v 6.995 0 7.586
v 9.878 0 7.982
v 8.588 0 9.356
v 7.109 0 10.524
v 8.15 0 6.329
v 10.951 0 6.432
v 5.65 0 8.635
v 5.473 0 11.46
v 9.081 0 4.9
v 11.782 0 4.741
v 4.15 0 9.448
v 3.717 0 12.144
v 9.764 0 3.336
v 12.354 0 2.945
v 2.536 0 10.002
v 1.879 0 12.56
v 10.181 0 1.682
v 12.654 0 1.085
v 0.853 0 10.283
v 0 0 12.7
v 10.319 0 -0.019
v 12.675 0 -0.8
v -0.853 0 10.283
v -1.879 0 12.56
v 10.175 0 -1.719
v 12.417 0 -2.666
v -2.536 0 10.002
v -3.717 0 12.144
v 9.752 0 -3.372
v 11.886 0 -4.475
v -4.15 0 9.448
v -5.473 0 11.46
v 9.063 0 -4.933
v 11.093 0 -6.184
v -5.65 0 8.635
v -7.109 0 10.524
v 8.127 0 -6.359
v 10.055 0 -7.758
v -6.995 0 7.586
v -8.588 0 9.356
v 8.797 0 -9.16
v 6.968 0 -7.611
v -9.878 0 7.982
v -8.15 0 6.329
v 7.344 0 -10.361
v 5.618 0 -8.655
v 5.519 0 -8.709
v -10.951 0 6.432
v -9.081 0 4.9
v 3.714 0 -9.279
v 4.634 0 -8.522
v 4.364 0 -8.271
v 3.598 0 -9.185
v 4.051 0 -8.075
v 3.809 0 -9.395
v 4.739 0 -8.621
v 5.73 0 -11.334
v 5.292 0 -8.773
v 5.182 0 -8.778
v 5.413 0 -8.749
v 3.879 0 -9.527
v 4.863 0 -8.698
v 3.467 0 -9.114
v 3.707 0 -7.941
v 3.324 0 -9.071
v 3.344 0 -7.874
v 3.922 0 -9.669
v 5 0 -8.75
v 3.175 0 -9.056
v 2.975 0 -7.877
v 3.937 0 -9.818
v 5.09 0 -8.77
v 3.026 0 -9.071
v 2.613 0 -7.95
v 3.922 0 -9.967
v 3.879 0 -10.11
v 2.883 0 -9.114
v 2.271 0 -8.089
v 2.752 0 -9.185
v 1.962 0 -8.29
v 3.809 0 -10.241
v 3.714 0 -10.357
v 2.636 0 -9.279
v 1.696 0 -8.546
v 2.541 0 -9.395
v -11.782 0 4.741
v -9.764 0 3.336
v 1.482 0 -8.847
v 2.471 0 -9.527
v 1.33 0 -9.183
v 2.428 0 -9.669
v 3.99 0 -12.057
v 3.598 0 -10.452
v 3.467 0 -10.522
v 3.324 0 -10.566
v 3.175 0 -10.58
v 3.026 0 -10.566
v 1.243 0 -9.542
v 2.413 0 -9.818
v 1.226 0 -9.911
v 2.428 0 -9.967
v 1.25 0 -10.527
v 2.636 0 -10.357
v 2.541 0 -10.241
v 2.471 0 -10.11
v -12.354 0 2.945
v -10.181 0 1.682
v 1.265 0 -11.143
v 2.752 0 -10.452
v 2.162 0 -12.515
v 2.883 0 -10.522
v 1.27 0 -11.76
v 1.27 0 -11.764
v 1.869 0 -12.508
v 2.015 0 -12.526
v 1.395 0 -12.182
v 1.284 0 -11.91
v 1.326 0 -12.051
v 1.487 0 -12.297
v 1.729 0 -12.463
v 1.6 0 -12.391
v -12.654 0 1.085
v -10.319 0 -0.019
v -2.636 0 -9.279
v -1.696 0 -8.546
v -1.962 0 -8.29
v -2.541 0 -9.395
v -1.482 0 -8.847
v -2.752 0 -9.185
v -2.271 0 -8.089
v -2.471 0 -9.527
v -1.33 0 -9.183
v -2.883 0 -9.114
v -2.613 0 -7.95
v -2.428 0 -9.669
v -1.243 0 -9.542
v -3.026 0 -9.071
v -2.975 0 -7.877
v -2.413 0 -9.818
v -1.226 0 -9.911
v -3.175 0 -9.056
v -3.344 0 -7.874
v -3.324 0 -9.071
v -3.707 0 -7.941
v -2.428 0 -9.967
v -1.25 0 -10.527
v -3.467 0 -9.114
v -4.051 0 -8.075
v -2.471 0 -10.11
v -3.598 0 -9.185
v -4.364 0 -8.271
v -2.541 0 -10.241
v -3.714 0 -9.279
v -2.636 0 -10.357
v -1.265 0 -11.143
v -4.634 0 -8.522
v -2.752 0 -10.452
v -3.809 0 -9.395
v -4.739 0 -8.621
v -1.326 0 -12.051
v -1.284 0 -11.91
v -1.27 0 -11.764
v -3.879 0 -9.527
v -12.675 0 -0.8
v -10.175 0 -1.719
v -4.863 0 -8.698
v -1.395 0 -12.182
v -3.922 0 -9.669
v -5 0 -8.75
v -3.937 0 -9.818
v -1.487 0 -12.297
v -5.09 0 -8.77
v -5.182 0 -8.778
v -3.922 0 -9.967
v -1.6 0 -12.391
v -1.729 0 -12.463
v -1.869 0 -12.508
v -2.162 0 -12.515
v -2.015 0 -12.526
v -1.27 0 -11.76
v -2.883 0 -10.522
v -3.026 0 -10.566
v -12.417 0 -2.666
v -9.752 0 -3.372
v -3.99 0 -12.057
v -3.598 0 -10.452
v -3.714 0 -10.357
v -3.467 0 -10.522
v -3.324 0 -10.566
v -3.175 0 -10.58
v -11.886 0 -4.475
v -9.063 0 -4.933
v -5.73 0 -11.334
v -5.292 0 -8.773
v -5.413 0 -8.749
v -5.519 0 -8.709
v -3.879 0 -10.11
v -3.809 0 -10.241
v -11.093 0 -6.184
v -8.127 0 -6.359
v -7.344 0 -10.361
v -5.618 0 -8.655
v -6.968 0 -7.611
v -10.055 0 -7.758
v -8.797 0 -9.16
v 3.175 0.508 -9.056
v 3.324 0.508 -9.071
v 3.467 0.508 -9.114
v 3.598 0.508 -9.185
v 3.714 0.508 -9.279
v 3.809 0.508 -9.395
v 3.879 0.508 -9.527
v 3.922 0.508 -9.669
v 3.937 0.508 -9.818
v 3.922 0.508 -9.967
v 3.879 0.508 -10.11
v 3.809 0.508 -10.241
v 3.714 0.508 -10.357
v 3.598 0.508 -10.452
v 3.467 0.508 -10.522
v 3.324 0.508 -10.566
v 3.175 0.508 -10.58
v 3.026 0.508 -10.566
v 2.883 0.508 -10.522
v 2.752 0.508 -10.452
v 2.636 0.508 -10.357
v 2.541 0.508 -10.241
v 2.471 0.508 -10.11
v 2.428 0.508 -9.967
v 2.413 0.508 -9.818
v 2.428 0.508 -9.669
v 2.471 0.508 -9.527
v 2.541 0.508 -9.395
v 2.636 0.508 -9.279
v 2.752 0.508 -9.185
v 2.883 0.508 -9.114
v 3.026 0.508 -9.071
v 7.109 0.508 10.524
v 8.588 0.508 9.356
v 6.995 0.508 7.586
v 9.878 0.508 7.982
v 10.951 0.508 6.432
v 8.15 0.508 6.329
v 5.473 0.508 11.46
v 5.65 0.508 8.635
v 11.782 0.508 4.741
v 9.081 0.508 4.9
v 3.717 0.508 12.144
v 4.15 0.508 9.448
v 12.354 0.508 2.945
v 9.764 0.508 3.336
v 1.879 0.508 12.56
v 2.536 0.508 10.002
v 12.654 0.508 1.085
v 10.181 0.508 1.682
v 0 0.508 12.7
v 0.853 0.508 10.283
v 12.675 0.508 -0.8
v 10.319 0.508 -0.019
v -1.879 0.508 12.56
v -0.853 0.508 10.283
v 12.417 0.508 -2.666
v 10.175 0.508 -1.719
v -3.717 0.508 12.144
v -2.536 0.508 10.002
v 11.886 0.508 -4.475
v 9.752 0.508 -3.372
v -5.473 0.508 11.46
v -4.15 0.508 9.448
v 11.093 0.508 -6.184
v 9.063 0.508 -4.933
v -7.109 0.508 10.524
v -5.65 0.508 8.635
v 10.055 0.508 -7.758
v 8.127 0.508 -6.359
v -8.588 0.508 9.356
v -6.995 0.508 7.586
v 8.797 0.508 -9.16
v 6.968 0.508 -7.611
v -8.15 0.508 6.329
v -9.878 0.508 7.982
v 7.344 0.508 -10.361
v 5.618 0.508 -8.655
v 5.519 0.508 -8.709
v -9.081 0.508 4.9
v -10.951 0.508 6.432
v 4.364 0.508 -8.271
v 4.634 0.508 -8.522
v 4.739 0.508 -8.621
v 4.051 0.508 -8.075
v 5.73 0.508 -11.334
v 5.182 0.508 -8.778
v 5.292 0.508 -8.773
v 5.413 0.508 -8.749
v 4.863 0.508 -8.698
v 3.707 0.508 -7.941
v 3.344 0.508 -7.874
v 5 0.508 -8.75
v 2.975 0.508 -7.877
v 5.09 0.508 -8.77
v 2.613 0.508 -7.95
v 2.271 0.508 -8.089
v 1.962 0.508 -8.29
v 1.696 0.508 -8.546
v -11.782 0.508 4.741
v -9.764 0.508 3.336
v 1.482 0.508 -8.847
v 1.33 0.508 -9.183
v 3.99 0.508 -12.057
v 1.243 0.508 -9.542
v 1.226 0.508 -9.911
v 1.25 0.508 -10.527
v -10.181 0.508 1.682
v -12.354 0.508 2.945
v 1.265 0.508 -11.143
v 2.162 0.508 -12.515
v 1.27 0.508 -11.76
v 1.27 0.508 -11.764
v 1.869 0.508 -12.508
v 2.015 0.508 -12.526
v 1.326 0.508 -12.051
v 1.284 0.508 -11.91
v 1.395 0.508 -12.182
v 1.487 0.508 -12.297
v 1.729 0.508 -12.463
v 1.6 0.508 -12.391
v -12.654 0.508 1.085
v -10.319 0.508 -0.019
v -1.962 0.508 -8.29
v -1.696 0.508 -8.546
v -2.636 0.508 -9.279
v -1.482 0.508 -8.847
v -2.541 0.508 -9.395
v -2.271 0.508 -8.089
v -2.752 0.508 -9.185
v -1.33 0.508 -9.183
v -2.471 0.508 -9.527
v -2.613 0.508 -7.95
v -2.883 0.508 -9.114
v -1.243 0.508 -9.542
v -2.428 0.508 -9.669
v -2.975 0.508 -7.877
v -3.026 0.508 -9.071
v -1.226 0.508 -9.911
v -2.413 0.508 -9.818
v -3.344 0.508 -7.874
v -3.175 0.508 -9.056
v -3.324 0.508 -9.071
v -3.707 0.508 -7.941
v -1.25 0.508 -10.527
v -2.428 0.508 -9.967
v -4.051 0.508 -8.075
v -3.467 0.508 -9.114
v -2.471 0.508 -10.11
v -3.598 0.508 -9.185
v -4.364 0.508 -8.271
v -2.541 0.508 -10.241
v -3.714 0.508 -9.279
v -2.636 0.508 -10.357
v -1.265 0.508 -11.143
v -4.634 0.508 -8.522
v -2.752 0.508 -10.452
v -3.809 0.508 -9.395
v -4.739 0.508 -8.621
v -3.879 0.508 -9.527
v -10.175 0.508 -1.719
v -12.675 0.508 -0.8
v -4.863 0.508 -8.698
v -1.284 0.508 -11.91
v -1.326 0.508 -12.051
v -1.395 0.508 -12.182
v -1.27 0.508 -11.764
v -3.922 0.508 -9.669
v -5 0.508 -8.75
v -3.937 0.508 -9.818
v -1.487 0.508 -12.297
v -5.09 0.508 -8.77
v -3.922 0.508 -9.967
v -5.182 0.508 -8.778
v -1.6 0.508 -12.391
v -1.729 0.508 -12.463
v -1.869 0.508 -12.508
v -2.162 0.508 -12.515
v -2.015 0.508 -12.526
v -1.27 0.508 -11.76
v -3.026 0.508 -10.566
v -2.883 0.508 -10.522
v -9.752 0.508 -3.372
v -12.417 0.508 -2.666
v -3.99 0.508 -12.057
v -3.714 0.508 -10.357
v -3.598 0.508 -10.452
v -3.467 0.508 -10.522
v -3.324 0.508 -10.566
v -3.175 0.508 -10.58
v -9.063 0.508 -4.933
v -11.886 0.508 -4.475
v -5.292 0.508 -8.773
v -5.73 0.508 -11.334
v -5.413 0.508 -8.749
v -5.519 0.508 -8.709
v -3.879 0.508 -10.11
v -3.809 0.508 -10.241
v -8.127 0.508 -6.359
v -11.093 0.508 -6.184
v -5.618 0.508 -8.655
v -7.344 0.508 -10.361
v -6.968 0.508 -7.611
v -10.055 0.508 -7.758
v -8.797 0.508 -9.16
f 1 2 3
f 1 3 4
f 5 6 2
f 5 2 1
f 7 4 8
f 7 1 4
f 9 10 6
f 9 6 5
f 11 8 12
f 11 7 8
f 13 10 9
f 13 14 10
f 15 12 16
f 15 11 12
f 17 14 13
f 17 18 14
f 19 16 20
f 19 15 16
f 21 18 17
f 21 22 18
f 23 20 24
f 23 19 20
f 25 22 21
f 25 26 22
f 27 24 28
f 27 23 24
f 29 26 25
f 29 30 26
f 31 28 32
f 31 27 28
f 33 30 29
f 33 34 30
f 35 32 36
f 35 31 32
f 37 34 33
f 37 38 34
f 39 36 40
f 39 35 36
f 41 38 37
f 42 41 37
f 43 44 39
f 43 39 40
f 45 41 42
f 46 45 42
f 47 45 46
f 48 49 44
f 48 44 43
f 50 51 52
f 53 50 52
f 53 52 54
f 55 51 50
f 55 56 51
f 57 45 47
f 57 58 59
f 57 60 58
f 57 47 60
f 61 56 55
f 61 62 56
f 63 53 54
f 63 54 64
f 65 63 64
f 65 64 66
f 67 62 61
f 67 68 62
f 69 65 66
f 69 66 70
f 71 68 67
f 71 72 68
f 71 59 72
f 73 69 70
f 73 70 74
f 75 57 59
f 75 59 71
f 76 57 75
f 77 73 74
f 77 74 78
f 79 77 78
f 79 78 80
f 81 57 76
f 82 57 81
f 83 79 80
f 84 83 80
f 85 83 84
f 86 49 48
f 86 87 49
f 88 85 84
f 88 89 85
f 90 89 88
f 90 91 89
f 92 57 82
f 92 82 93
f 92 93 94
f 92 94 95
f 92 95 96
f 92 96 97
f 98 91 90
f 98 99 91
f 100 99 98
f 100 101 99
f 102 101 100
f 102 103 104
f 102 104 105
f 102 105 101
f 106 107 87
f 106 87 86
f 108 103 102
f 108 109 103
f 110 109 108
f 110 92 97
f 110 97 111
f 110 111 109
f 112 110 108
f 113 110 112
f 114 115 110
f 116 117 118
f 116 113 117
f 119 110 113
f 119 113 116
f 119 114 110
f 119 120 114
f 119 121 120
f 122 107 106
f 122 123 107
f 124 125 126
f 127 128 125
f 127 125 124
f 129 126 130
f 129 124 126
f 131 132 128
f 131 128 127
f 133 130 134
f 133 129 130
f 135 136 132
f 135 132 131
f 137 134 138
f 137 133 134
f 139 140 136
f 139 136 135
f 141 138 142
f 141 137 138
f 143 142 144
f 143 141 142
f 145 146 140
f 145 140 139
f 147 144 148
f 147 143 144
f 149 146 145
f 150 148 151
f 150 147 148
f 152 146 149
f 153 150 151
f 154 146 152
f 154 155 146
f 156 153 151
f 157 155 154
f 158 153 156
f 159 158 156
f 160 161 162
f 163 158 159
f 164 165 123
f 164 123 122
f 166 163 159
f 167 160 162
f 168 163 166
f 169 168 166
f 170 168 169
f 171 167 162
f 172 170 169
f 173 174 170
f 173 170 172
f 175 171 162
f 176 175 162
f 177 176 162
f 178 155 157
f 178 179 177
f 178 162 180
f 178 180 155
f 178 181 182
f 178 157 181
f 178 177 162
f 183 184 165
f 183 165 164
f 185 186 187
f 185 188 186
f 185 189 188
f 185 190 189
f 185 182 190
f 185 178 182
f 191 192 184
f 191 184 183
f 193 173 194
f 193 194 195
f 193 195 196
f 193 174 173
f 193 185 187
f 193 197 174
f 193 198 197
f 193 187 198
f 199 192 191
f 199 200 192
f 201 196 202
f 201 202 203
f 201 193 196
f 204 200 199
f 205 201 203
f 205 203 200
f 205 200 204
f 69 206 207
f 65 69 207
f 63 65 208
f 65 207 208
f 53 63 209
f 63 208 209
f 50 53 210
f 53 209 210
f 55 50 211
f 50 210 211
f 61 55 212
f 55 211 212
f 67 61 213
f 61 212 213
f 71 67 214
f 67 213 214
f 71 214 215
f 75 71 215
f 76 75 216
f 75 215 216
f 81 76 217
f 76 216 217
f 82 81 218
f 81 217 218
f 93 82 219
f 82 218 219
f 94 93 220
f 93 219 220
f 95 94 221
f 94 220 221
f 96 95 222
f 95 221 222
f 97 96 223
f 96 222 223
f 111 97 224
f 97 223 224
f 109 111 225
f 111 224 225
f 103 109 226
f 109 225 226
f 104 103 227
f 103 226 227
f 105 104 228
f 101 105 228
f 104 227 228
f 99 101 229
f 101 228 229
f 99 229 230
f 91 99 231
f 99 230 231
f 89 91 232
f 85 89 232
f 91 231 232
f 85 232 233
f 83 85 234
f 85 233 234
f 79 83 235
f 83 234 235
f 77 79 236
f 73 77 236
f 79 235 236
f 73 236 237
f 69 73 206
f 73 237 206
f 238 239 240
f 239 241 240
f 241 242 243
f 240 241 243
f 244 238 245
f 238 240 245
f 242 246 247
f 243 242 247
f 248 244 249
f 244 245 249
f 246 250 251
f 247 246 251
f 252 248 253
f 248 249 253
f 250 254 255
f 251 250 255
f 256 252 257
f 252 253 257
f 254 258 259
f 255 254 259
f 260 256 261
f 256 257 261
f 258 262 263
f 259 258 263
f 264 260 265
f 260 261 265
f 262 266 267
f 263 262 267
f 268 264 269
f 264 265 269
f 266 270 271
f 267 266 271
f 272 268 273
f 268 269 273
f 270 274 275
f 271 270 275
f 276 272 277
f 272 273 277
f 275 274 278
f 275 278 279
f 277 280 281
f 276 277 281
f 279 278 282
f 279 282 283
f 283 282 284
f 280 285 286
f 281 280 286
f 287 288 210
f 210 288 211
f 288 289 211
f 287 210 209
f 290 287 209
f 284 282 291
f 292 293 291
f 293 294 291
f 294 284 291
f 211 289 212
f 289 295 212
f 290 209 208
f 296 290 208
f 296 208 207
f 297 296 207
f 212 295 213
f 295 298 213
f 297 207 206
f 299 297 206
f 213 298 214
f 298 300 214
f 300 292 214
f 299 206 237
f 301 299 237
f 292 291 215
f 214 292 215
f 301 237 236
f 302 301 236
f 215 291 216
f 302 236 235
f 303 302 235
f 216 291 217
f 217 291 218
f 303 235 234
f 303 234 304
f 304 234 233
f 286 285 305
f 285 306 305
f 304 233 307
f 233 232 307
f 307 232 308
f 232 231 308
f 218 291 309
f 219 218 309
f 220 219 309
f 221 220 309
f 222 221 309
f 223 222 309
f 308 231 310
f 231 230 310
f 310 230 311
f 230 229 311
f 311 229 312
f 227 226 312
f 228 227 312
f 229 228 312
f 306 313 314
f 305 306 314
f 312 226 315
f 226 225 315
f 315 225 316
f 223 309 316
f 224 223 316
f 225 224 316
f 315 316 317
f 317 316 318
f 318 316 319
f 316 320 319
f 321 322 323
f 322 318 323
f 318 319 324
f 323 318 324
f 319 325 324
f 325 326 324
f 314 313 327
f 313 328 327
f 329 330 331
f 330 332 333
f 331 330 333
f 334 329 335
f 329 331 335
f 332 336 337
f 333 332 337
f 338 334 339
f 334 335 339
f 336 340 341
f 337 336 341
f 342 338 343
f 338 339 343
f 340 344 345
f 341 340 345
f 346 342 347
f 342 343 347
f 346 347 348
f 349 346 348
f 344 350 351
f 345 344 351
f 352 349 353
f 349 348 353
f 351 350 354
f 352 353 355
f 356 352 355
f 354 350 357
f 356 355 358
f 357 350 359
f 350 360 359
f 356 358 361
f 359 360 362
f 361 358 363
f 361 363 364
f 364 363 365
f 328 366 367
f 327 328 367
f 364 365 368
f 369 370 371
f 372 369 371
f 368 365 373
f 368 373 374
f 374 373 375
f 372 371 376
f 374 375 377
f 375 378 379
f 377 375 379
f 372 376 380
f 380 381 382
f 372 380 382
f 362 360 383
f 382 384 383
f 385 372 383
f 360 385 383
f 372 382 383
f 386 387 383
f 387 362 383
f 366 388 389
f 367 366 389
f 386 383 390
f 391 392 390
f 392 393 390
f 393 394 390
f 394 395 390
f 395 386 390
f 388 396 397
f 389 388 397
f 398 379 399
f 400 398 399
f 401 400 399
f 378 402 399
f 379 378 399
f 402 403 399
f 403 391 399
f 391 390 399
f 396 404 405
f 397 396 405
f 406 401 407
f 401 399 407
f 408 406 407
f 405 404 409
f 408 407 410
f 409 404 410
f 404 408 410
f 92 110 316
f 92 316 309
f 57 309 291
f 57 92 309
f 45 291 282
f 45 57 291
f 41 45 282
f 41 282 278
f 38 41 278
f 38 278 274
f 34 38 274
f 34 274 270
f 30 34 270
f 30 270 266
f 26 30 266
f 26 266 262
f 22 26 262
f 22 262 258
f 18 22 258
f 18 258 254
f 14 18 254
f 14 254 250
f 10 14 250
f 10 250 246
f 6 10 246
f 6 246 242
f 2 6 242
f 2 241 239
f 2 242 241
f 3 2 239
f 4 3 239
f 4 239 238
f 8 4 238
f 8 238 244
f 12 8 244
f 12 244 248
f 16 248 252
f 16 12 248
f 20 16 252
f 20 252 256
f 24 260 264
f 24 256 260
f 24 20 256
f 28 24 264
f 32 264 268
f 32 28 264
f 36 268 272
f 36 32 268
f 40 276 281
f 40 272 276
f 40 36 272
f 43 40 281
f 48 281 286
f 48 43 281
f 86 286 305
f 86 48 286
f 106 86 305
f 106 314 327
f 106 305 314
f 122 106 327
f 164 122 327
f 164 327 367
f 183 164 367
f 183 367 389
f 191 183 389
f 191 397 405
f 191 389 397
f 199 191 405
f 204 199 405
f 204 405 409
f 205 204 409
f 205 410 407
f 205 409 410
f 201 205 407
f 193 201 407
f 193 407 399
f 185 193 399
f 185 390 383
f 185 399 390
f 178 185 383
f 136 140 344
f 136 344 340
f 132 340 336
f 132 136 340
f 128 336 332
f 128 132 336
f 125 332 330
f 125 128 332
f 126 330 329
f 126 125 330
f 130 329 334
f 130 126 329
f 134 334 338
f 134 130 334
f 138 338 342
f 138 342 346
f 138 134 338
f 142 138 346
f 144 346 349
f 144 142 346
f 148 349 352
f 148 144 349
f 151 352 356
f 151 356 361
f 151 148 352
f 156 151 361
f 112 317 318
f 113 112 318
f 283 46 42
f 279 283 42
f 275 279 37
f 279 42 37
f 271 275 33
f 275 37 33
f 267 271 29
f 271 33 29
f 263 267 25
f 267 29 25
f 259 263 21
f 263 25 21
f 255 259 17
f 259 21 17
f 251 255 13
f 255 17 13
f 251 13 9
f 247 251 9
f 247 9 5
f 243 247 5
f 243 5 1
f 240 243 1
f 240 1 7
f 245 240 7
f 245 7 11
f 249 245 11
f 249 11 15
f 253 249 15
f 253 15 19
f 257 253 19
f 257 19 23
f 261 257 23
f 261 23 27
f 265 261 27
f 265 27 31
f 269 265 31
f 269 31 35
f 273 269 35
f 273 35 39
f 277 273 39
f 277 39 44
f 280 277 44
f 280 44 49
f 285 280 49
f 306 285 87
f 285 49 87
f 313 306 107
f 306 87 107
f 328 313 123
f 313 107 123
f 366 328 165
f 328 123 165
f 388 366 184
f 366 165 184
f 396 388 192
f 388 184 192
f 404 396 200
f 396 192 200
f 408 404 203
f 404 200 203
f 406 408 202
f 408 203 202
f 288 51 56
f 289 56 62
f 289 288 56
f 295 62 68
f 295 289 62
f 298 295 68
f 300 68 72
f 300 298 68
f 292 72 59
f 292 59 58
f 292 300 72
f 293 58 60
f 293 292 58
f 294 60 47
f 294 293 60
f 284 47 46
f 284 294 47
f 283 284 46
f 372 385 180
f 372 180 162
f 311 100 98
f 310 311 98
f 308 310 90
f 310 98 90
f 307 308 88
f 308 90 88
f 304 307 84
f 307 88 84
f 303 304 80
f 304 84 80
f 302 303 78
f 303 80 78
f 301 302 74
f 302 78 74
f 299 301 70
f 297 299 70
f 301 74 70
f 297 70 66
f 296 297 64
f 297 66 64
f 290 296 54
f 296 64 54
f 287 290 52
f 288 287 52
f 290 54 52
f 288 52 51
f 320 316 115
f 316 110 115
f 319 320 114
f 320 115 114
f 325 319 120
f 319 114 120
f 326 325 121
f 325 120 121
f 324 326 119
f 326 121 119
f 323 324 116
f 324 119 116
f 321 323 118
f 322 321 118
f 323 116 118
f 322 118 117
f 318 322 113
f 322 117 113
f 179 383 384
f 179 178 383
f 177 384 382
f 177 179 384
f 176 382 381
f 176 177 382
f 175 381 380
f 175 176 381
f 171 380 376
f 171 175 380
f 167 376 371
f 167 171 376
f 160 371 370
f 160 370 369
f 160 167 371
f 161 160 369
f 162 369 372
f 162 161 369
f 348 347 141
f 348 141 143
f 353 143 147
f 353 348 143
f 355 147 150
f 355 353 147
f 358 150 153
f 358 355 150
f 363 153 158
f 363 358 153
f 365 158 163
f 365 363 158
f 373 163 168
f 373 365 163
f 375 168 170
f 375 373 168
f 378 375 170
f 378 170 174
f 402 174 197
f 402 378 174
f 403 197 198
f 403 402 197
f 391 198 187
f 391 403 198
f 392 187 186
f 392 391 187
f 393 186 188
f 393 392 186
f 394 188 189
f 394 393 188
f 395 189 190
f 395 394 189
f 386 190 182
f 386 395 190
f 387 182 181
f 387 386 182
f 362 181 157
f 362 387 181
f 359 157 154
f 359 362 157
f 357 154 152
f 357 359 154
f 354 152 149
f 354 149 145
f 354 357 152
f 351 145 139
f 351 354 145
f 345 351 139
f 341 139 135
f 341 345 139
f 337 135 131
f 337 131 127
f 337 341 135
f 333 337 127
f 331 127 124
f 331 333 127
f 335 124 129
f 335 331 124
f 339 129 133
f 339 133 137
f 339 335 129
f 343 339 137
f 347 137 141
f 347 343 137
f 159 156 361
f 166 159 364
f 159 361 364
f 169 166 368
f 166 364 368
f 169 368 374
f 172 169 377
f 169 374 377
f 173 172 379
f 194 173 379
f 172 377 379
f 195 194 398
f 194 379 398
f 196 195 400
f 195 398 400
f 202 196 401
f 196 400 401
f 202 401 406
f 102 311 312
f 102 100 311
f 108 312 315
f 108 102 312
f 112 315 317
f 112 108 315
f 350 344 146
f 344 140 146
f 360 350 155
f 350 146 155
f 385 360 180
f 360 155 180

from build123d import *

# Parameters (mm, degrees)
SKETCH1_R           = 12.7
SKETCH1_R_2         = 10.31875
BOSS_EXTRUDE1_DEPTH = 0.508
SKETCH2_W           = 2.54
SKETCH2_H           = 4.365272308
CUT_EXTRUDE1_DEPTH  = 0.508
FILLET1_R           = 0.762
BOSS_EXTRUDE2_START = -0.508
BOSS_EXTRUDE2_DEPTH = 0.508
SKETCH4_R           = 0.762
CUT_EXTRUDE2_DEPTH  = 0.508
CUT_EXTRUDE4_DEPTH  = 12.7
FILLET2_R           = 0.762
FILLET3_R           = 38.862


with BuildPart() as part:
    # Sketch1 → Boss-Extrude1 (new body)
    with BuildSketch(Plane(origin=(0, 0, 0), x_dir=(1, 0, 0), z_dir=(0, 1, 0))):
        with Locations(Location((0, 0, 0), (0, 0, 270))):
            Circle(SKETCH1_R)
        with Locations(Location((0, 0, 0), (0, 0, 270))):
            Circle(SKETCH1_R_2, mode=Mode.SUBTRACT)
    extrude(amount=BOSS_EXTRUDE1_DEPTH)

    # Sketch2 → Cut-Extrude1 (cut)
    with BuildSketch(Plane(origin=(0, 0.508, 0), x_dir=(1, 0, 0), z_dir=(0, 1, 0))):
        with Locations((0, 11.342245997)):
            Rectangle(SKETCH2_W, SKETCH2_H)
    extrude(amount=-CUT_EXTRUDE1_DEPTH, mode=Mode.SUBTRACT)

    # Fillet1
    fillet1_edges = [part.edges().sort_by_distance(p)[0] for p in [
        (-1.27, 0.254, -12.636340451),
        (1.27, 0.254, -12.636340451),
    ]]
    fillet(fillet1_edges, radius=FILLET1_R)

    # Sketch3 → Boss-Extrude2 (add)
    with BuildSketch(Plane(origin=(0, 0.508, 0), x_dir=(1, 0, 0), z_dir=(0, 1, 0)).offset(BOSS_EXTRUDE2_START)):
        with BuildLine():
            ThreePointArc((1.27, 10.240297924), (2.574626321, 7.9615922), (4.966472896, 9.044929438))
            ThreePointArc((4.966472896, 9.044929438), (3.175, 9.818145271), (1.27, 10.240297924))
        make_face()
    extrude(amount=BOSS_EXTRUDE2_DEPTH)

    # Sketch4 → Cut-Extrude2 (cut)
    with BuildSketch(Plane(origin=(0, 0.508, 0), x_dir=(-1, 0, 0), z_dir=(0, 1, 0))):
        with Locations(Location((-3.175, -9.818145271, 0), (0, 0, 90))):
            Circle(SKETCH4_R)
    extrude(amount=-CUT_EXTRUDE2_DEPTH, mode=Mode.SUBTRACT)

    # Sketch5 → Cut-Extrude4 (cut, symmetric)
    with BuildSketch(Plane(origin=(0, 0, 0), x_dir=(1, 0, 0), z_dir=(0, 1, 0))):
        Polygon((0, 13.122692647), (0, -13.667441161), (-16.637303015, -10.48078624), (-17.785980951, 10.084254234), (-7.744312539, 13.715558678), align=None)
    extrude(amount=CUT_EXTRUDE4_DEPTH, both=True, mode=Mode.SUBTRACT)

    # Fillet2
    fillet2_edges = [part.edges().sort_by_distance(p)[0] for p in [
        (4.966472896, 0.254, -9.044929438),
    ]]
    fillet(fillet2_edges, radius=FILLET2_R)

    # Fillet3
    fillet3_edges = [part.edges().sort_by_distance(p)[0] for p in [
        (1.27, 0.254, -10.240297924),
    ]]
    fillet(fillet3_edges, radius=FILLET3_R)

    # Mirror1: part across plane


with BuildPart() as part_1:
    add(part.part)
    add(part.part.mirror(Plane(origin=(0, 0, 0), x_dir=(0, 0, 1), z_dir=(1, 0, 0))))


solid = part_1.part
